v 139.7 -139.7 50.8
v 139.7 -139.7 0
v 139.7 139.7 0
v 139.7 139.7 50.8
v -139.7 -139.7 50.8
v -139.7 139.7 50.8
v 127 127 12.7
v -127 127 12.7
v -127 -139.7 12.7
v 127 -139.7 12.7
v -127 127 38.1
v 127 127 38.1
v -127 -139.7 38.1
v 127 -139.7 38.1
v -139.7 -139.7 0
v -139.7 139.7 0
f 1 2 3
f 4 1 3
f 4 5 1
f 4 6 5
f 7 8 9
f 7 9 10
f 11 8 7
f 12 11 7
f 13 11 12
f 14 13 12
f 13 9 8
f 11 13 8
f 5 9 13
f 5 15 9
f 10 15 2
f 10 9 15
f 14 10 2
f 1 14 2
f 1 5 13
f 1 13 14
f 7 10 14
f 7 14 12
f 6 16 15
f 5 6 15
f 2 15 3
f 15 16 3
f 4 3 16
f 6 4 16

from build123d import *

# Parameters (mm, degrees)
F0_W     = 12.7
F0_H     = 266.7
F1_DEPTH = 50.8
F2_W     = 254
F2_H     = 12.7
F3_DEPTH = 266.7
F4_W     = 254
F4_H     = 12.7
F5_DEPTH = 266.7


with BuildPart() as f1:
    # F0 (on Top) → F1 (new body)
    with BuildSketch(Plane.XY):
        Polygon((-127, 139.7), (-139.7, 139.7), (-139.7, -139.7), (-127, -139.7), (-127, 127), align=None)
        Polygon((139.7, 139.7), (-127, 139.7), (-127, 127), (127, 127), (139.7, 127), align=None)
        with Locations((133.35, -6.35)):
            Rectangle(F0_W, F0_H)
    extrude(amount=F1_DEPTH)

    # F2 (on face) → F3 (join)
    with BuildSketch(Plane.XZ.offset(-127)):
        with Locations((0, 44.45)):
            Rectangle(F2_W, F2_H)
    extrude(amount=F3_DEPTH)

    # F4 (on face) → F5 (join)
    with BuildSketch(Plane.XZ.offset(-127)):
        with Locations((0, 6.35)):
            Rectangle(F4_W, F4_H)
    extrude(amount=F5_DEPTH)


solid = f1.part
